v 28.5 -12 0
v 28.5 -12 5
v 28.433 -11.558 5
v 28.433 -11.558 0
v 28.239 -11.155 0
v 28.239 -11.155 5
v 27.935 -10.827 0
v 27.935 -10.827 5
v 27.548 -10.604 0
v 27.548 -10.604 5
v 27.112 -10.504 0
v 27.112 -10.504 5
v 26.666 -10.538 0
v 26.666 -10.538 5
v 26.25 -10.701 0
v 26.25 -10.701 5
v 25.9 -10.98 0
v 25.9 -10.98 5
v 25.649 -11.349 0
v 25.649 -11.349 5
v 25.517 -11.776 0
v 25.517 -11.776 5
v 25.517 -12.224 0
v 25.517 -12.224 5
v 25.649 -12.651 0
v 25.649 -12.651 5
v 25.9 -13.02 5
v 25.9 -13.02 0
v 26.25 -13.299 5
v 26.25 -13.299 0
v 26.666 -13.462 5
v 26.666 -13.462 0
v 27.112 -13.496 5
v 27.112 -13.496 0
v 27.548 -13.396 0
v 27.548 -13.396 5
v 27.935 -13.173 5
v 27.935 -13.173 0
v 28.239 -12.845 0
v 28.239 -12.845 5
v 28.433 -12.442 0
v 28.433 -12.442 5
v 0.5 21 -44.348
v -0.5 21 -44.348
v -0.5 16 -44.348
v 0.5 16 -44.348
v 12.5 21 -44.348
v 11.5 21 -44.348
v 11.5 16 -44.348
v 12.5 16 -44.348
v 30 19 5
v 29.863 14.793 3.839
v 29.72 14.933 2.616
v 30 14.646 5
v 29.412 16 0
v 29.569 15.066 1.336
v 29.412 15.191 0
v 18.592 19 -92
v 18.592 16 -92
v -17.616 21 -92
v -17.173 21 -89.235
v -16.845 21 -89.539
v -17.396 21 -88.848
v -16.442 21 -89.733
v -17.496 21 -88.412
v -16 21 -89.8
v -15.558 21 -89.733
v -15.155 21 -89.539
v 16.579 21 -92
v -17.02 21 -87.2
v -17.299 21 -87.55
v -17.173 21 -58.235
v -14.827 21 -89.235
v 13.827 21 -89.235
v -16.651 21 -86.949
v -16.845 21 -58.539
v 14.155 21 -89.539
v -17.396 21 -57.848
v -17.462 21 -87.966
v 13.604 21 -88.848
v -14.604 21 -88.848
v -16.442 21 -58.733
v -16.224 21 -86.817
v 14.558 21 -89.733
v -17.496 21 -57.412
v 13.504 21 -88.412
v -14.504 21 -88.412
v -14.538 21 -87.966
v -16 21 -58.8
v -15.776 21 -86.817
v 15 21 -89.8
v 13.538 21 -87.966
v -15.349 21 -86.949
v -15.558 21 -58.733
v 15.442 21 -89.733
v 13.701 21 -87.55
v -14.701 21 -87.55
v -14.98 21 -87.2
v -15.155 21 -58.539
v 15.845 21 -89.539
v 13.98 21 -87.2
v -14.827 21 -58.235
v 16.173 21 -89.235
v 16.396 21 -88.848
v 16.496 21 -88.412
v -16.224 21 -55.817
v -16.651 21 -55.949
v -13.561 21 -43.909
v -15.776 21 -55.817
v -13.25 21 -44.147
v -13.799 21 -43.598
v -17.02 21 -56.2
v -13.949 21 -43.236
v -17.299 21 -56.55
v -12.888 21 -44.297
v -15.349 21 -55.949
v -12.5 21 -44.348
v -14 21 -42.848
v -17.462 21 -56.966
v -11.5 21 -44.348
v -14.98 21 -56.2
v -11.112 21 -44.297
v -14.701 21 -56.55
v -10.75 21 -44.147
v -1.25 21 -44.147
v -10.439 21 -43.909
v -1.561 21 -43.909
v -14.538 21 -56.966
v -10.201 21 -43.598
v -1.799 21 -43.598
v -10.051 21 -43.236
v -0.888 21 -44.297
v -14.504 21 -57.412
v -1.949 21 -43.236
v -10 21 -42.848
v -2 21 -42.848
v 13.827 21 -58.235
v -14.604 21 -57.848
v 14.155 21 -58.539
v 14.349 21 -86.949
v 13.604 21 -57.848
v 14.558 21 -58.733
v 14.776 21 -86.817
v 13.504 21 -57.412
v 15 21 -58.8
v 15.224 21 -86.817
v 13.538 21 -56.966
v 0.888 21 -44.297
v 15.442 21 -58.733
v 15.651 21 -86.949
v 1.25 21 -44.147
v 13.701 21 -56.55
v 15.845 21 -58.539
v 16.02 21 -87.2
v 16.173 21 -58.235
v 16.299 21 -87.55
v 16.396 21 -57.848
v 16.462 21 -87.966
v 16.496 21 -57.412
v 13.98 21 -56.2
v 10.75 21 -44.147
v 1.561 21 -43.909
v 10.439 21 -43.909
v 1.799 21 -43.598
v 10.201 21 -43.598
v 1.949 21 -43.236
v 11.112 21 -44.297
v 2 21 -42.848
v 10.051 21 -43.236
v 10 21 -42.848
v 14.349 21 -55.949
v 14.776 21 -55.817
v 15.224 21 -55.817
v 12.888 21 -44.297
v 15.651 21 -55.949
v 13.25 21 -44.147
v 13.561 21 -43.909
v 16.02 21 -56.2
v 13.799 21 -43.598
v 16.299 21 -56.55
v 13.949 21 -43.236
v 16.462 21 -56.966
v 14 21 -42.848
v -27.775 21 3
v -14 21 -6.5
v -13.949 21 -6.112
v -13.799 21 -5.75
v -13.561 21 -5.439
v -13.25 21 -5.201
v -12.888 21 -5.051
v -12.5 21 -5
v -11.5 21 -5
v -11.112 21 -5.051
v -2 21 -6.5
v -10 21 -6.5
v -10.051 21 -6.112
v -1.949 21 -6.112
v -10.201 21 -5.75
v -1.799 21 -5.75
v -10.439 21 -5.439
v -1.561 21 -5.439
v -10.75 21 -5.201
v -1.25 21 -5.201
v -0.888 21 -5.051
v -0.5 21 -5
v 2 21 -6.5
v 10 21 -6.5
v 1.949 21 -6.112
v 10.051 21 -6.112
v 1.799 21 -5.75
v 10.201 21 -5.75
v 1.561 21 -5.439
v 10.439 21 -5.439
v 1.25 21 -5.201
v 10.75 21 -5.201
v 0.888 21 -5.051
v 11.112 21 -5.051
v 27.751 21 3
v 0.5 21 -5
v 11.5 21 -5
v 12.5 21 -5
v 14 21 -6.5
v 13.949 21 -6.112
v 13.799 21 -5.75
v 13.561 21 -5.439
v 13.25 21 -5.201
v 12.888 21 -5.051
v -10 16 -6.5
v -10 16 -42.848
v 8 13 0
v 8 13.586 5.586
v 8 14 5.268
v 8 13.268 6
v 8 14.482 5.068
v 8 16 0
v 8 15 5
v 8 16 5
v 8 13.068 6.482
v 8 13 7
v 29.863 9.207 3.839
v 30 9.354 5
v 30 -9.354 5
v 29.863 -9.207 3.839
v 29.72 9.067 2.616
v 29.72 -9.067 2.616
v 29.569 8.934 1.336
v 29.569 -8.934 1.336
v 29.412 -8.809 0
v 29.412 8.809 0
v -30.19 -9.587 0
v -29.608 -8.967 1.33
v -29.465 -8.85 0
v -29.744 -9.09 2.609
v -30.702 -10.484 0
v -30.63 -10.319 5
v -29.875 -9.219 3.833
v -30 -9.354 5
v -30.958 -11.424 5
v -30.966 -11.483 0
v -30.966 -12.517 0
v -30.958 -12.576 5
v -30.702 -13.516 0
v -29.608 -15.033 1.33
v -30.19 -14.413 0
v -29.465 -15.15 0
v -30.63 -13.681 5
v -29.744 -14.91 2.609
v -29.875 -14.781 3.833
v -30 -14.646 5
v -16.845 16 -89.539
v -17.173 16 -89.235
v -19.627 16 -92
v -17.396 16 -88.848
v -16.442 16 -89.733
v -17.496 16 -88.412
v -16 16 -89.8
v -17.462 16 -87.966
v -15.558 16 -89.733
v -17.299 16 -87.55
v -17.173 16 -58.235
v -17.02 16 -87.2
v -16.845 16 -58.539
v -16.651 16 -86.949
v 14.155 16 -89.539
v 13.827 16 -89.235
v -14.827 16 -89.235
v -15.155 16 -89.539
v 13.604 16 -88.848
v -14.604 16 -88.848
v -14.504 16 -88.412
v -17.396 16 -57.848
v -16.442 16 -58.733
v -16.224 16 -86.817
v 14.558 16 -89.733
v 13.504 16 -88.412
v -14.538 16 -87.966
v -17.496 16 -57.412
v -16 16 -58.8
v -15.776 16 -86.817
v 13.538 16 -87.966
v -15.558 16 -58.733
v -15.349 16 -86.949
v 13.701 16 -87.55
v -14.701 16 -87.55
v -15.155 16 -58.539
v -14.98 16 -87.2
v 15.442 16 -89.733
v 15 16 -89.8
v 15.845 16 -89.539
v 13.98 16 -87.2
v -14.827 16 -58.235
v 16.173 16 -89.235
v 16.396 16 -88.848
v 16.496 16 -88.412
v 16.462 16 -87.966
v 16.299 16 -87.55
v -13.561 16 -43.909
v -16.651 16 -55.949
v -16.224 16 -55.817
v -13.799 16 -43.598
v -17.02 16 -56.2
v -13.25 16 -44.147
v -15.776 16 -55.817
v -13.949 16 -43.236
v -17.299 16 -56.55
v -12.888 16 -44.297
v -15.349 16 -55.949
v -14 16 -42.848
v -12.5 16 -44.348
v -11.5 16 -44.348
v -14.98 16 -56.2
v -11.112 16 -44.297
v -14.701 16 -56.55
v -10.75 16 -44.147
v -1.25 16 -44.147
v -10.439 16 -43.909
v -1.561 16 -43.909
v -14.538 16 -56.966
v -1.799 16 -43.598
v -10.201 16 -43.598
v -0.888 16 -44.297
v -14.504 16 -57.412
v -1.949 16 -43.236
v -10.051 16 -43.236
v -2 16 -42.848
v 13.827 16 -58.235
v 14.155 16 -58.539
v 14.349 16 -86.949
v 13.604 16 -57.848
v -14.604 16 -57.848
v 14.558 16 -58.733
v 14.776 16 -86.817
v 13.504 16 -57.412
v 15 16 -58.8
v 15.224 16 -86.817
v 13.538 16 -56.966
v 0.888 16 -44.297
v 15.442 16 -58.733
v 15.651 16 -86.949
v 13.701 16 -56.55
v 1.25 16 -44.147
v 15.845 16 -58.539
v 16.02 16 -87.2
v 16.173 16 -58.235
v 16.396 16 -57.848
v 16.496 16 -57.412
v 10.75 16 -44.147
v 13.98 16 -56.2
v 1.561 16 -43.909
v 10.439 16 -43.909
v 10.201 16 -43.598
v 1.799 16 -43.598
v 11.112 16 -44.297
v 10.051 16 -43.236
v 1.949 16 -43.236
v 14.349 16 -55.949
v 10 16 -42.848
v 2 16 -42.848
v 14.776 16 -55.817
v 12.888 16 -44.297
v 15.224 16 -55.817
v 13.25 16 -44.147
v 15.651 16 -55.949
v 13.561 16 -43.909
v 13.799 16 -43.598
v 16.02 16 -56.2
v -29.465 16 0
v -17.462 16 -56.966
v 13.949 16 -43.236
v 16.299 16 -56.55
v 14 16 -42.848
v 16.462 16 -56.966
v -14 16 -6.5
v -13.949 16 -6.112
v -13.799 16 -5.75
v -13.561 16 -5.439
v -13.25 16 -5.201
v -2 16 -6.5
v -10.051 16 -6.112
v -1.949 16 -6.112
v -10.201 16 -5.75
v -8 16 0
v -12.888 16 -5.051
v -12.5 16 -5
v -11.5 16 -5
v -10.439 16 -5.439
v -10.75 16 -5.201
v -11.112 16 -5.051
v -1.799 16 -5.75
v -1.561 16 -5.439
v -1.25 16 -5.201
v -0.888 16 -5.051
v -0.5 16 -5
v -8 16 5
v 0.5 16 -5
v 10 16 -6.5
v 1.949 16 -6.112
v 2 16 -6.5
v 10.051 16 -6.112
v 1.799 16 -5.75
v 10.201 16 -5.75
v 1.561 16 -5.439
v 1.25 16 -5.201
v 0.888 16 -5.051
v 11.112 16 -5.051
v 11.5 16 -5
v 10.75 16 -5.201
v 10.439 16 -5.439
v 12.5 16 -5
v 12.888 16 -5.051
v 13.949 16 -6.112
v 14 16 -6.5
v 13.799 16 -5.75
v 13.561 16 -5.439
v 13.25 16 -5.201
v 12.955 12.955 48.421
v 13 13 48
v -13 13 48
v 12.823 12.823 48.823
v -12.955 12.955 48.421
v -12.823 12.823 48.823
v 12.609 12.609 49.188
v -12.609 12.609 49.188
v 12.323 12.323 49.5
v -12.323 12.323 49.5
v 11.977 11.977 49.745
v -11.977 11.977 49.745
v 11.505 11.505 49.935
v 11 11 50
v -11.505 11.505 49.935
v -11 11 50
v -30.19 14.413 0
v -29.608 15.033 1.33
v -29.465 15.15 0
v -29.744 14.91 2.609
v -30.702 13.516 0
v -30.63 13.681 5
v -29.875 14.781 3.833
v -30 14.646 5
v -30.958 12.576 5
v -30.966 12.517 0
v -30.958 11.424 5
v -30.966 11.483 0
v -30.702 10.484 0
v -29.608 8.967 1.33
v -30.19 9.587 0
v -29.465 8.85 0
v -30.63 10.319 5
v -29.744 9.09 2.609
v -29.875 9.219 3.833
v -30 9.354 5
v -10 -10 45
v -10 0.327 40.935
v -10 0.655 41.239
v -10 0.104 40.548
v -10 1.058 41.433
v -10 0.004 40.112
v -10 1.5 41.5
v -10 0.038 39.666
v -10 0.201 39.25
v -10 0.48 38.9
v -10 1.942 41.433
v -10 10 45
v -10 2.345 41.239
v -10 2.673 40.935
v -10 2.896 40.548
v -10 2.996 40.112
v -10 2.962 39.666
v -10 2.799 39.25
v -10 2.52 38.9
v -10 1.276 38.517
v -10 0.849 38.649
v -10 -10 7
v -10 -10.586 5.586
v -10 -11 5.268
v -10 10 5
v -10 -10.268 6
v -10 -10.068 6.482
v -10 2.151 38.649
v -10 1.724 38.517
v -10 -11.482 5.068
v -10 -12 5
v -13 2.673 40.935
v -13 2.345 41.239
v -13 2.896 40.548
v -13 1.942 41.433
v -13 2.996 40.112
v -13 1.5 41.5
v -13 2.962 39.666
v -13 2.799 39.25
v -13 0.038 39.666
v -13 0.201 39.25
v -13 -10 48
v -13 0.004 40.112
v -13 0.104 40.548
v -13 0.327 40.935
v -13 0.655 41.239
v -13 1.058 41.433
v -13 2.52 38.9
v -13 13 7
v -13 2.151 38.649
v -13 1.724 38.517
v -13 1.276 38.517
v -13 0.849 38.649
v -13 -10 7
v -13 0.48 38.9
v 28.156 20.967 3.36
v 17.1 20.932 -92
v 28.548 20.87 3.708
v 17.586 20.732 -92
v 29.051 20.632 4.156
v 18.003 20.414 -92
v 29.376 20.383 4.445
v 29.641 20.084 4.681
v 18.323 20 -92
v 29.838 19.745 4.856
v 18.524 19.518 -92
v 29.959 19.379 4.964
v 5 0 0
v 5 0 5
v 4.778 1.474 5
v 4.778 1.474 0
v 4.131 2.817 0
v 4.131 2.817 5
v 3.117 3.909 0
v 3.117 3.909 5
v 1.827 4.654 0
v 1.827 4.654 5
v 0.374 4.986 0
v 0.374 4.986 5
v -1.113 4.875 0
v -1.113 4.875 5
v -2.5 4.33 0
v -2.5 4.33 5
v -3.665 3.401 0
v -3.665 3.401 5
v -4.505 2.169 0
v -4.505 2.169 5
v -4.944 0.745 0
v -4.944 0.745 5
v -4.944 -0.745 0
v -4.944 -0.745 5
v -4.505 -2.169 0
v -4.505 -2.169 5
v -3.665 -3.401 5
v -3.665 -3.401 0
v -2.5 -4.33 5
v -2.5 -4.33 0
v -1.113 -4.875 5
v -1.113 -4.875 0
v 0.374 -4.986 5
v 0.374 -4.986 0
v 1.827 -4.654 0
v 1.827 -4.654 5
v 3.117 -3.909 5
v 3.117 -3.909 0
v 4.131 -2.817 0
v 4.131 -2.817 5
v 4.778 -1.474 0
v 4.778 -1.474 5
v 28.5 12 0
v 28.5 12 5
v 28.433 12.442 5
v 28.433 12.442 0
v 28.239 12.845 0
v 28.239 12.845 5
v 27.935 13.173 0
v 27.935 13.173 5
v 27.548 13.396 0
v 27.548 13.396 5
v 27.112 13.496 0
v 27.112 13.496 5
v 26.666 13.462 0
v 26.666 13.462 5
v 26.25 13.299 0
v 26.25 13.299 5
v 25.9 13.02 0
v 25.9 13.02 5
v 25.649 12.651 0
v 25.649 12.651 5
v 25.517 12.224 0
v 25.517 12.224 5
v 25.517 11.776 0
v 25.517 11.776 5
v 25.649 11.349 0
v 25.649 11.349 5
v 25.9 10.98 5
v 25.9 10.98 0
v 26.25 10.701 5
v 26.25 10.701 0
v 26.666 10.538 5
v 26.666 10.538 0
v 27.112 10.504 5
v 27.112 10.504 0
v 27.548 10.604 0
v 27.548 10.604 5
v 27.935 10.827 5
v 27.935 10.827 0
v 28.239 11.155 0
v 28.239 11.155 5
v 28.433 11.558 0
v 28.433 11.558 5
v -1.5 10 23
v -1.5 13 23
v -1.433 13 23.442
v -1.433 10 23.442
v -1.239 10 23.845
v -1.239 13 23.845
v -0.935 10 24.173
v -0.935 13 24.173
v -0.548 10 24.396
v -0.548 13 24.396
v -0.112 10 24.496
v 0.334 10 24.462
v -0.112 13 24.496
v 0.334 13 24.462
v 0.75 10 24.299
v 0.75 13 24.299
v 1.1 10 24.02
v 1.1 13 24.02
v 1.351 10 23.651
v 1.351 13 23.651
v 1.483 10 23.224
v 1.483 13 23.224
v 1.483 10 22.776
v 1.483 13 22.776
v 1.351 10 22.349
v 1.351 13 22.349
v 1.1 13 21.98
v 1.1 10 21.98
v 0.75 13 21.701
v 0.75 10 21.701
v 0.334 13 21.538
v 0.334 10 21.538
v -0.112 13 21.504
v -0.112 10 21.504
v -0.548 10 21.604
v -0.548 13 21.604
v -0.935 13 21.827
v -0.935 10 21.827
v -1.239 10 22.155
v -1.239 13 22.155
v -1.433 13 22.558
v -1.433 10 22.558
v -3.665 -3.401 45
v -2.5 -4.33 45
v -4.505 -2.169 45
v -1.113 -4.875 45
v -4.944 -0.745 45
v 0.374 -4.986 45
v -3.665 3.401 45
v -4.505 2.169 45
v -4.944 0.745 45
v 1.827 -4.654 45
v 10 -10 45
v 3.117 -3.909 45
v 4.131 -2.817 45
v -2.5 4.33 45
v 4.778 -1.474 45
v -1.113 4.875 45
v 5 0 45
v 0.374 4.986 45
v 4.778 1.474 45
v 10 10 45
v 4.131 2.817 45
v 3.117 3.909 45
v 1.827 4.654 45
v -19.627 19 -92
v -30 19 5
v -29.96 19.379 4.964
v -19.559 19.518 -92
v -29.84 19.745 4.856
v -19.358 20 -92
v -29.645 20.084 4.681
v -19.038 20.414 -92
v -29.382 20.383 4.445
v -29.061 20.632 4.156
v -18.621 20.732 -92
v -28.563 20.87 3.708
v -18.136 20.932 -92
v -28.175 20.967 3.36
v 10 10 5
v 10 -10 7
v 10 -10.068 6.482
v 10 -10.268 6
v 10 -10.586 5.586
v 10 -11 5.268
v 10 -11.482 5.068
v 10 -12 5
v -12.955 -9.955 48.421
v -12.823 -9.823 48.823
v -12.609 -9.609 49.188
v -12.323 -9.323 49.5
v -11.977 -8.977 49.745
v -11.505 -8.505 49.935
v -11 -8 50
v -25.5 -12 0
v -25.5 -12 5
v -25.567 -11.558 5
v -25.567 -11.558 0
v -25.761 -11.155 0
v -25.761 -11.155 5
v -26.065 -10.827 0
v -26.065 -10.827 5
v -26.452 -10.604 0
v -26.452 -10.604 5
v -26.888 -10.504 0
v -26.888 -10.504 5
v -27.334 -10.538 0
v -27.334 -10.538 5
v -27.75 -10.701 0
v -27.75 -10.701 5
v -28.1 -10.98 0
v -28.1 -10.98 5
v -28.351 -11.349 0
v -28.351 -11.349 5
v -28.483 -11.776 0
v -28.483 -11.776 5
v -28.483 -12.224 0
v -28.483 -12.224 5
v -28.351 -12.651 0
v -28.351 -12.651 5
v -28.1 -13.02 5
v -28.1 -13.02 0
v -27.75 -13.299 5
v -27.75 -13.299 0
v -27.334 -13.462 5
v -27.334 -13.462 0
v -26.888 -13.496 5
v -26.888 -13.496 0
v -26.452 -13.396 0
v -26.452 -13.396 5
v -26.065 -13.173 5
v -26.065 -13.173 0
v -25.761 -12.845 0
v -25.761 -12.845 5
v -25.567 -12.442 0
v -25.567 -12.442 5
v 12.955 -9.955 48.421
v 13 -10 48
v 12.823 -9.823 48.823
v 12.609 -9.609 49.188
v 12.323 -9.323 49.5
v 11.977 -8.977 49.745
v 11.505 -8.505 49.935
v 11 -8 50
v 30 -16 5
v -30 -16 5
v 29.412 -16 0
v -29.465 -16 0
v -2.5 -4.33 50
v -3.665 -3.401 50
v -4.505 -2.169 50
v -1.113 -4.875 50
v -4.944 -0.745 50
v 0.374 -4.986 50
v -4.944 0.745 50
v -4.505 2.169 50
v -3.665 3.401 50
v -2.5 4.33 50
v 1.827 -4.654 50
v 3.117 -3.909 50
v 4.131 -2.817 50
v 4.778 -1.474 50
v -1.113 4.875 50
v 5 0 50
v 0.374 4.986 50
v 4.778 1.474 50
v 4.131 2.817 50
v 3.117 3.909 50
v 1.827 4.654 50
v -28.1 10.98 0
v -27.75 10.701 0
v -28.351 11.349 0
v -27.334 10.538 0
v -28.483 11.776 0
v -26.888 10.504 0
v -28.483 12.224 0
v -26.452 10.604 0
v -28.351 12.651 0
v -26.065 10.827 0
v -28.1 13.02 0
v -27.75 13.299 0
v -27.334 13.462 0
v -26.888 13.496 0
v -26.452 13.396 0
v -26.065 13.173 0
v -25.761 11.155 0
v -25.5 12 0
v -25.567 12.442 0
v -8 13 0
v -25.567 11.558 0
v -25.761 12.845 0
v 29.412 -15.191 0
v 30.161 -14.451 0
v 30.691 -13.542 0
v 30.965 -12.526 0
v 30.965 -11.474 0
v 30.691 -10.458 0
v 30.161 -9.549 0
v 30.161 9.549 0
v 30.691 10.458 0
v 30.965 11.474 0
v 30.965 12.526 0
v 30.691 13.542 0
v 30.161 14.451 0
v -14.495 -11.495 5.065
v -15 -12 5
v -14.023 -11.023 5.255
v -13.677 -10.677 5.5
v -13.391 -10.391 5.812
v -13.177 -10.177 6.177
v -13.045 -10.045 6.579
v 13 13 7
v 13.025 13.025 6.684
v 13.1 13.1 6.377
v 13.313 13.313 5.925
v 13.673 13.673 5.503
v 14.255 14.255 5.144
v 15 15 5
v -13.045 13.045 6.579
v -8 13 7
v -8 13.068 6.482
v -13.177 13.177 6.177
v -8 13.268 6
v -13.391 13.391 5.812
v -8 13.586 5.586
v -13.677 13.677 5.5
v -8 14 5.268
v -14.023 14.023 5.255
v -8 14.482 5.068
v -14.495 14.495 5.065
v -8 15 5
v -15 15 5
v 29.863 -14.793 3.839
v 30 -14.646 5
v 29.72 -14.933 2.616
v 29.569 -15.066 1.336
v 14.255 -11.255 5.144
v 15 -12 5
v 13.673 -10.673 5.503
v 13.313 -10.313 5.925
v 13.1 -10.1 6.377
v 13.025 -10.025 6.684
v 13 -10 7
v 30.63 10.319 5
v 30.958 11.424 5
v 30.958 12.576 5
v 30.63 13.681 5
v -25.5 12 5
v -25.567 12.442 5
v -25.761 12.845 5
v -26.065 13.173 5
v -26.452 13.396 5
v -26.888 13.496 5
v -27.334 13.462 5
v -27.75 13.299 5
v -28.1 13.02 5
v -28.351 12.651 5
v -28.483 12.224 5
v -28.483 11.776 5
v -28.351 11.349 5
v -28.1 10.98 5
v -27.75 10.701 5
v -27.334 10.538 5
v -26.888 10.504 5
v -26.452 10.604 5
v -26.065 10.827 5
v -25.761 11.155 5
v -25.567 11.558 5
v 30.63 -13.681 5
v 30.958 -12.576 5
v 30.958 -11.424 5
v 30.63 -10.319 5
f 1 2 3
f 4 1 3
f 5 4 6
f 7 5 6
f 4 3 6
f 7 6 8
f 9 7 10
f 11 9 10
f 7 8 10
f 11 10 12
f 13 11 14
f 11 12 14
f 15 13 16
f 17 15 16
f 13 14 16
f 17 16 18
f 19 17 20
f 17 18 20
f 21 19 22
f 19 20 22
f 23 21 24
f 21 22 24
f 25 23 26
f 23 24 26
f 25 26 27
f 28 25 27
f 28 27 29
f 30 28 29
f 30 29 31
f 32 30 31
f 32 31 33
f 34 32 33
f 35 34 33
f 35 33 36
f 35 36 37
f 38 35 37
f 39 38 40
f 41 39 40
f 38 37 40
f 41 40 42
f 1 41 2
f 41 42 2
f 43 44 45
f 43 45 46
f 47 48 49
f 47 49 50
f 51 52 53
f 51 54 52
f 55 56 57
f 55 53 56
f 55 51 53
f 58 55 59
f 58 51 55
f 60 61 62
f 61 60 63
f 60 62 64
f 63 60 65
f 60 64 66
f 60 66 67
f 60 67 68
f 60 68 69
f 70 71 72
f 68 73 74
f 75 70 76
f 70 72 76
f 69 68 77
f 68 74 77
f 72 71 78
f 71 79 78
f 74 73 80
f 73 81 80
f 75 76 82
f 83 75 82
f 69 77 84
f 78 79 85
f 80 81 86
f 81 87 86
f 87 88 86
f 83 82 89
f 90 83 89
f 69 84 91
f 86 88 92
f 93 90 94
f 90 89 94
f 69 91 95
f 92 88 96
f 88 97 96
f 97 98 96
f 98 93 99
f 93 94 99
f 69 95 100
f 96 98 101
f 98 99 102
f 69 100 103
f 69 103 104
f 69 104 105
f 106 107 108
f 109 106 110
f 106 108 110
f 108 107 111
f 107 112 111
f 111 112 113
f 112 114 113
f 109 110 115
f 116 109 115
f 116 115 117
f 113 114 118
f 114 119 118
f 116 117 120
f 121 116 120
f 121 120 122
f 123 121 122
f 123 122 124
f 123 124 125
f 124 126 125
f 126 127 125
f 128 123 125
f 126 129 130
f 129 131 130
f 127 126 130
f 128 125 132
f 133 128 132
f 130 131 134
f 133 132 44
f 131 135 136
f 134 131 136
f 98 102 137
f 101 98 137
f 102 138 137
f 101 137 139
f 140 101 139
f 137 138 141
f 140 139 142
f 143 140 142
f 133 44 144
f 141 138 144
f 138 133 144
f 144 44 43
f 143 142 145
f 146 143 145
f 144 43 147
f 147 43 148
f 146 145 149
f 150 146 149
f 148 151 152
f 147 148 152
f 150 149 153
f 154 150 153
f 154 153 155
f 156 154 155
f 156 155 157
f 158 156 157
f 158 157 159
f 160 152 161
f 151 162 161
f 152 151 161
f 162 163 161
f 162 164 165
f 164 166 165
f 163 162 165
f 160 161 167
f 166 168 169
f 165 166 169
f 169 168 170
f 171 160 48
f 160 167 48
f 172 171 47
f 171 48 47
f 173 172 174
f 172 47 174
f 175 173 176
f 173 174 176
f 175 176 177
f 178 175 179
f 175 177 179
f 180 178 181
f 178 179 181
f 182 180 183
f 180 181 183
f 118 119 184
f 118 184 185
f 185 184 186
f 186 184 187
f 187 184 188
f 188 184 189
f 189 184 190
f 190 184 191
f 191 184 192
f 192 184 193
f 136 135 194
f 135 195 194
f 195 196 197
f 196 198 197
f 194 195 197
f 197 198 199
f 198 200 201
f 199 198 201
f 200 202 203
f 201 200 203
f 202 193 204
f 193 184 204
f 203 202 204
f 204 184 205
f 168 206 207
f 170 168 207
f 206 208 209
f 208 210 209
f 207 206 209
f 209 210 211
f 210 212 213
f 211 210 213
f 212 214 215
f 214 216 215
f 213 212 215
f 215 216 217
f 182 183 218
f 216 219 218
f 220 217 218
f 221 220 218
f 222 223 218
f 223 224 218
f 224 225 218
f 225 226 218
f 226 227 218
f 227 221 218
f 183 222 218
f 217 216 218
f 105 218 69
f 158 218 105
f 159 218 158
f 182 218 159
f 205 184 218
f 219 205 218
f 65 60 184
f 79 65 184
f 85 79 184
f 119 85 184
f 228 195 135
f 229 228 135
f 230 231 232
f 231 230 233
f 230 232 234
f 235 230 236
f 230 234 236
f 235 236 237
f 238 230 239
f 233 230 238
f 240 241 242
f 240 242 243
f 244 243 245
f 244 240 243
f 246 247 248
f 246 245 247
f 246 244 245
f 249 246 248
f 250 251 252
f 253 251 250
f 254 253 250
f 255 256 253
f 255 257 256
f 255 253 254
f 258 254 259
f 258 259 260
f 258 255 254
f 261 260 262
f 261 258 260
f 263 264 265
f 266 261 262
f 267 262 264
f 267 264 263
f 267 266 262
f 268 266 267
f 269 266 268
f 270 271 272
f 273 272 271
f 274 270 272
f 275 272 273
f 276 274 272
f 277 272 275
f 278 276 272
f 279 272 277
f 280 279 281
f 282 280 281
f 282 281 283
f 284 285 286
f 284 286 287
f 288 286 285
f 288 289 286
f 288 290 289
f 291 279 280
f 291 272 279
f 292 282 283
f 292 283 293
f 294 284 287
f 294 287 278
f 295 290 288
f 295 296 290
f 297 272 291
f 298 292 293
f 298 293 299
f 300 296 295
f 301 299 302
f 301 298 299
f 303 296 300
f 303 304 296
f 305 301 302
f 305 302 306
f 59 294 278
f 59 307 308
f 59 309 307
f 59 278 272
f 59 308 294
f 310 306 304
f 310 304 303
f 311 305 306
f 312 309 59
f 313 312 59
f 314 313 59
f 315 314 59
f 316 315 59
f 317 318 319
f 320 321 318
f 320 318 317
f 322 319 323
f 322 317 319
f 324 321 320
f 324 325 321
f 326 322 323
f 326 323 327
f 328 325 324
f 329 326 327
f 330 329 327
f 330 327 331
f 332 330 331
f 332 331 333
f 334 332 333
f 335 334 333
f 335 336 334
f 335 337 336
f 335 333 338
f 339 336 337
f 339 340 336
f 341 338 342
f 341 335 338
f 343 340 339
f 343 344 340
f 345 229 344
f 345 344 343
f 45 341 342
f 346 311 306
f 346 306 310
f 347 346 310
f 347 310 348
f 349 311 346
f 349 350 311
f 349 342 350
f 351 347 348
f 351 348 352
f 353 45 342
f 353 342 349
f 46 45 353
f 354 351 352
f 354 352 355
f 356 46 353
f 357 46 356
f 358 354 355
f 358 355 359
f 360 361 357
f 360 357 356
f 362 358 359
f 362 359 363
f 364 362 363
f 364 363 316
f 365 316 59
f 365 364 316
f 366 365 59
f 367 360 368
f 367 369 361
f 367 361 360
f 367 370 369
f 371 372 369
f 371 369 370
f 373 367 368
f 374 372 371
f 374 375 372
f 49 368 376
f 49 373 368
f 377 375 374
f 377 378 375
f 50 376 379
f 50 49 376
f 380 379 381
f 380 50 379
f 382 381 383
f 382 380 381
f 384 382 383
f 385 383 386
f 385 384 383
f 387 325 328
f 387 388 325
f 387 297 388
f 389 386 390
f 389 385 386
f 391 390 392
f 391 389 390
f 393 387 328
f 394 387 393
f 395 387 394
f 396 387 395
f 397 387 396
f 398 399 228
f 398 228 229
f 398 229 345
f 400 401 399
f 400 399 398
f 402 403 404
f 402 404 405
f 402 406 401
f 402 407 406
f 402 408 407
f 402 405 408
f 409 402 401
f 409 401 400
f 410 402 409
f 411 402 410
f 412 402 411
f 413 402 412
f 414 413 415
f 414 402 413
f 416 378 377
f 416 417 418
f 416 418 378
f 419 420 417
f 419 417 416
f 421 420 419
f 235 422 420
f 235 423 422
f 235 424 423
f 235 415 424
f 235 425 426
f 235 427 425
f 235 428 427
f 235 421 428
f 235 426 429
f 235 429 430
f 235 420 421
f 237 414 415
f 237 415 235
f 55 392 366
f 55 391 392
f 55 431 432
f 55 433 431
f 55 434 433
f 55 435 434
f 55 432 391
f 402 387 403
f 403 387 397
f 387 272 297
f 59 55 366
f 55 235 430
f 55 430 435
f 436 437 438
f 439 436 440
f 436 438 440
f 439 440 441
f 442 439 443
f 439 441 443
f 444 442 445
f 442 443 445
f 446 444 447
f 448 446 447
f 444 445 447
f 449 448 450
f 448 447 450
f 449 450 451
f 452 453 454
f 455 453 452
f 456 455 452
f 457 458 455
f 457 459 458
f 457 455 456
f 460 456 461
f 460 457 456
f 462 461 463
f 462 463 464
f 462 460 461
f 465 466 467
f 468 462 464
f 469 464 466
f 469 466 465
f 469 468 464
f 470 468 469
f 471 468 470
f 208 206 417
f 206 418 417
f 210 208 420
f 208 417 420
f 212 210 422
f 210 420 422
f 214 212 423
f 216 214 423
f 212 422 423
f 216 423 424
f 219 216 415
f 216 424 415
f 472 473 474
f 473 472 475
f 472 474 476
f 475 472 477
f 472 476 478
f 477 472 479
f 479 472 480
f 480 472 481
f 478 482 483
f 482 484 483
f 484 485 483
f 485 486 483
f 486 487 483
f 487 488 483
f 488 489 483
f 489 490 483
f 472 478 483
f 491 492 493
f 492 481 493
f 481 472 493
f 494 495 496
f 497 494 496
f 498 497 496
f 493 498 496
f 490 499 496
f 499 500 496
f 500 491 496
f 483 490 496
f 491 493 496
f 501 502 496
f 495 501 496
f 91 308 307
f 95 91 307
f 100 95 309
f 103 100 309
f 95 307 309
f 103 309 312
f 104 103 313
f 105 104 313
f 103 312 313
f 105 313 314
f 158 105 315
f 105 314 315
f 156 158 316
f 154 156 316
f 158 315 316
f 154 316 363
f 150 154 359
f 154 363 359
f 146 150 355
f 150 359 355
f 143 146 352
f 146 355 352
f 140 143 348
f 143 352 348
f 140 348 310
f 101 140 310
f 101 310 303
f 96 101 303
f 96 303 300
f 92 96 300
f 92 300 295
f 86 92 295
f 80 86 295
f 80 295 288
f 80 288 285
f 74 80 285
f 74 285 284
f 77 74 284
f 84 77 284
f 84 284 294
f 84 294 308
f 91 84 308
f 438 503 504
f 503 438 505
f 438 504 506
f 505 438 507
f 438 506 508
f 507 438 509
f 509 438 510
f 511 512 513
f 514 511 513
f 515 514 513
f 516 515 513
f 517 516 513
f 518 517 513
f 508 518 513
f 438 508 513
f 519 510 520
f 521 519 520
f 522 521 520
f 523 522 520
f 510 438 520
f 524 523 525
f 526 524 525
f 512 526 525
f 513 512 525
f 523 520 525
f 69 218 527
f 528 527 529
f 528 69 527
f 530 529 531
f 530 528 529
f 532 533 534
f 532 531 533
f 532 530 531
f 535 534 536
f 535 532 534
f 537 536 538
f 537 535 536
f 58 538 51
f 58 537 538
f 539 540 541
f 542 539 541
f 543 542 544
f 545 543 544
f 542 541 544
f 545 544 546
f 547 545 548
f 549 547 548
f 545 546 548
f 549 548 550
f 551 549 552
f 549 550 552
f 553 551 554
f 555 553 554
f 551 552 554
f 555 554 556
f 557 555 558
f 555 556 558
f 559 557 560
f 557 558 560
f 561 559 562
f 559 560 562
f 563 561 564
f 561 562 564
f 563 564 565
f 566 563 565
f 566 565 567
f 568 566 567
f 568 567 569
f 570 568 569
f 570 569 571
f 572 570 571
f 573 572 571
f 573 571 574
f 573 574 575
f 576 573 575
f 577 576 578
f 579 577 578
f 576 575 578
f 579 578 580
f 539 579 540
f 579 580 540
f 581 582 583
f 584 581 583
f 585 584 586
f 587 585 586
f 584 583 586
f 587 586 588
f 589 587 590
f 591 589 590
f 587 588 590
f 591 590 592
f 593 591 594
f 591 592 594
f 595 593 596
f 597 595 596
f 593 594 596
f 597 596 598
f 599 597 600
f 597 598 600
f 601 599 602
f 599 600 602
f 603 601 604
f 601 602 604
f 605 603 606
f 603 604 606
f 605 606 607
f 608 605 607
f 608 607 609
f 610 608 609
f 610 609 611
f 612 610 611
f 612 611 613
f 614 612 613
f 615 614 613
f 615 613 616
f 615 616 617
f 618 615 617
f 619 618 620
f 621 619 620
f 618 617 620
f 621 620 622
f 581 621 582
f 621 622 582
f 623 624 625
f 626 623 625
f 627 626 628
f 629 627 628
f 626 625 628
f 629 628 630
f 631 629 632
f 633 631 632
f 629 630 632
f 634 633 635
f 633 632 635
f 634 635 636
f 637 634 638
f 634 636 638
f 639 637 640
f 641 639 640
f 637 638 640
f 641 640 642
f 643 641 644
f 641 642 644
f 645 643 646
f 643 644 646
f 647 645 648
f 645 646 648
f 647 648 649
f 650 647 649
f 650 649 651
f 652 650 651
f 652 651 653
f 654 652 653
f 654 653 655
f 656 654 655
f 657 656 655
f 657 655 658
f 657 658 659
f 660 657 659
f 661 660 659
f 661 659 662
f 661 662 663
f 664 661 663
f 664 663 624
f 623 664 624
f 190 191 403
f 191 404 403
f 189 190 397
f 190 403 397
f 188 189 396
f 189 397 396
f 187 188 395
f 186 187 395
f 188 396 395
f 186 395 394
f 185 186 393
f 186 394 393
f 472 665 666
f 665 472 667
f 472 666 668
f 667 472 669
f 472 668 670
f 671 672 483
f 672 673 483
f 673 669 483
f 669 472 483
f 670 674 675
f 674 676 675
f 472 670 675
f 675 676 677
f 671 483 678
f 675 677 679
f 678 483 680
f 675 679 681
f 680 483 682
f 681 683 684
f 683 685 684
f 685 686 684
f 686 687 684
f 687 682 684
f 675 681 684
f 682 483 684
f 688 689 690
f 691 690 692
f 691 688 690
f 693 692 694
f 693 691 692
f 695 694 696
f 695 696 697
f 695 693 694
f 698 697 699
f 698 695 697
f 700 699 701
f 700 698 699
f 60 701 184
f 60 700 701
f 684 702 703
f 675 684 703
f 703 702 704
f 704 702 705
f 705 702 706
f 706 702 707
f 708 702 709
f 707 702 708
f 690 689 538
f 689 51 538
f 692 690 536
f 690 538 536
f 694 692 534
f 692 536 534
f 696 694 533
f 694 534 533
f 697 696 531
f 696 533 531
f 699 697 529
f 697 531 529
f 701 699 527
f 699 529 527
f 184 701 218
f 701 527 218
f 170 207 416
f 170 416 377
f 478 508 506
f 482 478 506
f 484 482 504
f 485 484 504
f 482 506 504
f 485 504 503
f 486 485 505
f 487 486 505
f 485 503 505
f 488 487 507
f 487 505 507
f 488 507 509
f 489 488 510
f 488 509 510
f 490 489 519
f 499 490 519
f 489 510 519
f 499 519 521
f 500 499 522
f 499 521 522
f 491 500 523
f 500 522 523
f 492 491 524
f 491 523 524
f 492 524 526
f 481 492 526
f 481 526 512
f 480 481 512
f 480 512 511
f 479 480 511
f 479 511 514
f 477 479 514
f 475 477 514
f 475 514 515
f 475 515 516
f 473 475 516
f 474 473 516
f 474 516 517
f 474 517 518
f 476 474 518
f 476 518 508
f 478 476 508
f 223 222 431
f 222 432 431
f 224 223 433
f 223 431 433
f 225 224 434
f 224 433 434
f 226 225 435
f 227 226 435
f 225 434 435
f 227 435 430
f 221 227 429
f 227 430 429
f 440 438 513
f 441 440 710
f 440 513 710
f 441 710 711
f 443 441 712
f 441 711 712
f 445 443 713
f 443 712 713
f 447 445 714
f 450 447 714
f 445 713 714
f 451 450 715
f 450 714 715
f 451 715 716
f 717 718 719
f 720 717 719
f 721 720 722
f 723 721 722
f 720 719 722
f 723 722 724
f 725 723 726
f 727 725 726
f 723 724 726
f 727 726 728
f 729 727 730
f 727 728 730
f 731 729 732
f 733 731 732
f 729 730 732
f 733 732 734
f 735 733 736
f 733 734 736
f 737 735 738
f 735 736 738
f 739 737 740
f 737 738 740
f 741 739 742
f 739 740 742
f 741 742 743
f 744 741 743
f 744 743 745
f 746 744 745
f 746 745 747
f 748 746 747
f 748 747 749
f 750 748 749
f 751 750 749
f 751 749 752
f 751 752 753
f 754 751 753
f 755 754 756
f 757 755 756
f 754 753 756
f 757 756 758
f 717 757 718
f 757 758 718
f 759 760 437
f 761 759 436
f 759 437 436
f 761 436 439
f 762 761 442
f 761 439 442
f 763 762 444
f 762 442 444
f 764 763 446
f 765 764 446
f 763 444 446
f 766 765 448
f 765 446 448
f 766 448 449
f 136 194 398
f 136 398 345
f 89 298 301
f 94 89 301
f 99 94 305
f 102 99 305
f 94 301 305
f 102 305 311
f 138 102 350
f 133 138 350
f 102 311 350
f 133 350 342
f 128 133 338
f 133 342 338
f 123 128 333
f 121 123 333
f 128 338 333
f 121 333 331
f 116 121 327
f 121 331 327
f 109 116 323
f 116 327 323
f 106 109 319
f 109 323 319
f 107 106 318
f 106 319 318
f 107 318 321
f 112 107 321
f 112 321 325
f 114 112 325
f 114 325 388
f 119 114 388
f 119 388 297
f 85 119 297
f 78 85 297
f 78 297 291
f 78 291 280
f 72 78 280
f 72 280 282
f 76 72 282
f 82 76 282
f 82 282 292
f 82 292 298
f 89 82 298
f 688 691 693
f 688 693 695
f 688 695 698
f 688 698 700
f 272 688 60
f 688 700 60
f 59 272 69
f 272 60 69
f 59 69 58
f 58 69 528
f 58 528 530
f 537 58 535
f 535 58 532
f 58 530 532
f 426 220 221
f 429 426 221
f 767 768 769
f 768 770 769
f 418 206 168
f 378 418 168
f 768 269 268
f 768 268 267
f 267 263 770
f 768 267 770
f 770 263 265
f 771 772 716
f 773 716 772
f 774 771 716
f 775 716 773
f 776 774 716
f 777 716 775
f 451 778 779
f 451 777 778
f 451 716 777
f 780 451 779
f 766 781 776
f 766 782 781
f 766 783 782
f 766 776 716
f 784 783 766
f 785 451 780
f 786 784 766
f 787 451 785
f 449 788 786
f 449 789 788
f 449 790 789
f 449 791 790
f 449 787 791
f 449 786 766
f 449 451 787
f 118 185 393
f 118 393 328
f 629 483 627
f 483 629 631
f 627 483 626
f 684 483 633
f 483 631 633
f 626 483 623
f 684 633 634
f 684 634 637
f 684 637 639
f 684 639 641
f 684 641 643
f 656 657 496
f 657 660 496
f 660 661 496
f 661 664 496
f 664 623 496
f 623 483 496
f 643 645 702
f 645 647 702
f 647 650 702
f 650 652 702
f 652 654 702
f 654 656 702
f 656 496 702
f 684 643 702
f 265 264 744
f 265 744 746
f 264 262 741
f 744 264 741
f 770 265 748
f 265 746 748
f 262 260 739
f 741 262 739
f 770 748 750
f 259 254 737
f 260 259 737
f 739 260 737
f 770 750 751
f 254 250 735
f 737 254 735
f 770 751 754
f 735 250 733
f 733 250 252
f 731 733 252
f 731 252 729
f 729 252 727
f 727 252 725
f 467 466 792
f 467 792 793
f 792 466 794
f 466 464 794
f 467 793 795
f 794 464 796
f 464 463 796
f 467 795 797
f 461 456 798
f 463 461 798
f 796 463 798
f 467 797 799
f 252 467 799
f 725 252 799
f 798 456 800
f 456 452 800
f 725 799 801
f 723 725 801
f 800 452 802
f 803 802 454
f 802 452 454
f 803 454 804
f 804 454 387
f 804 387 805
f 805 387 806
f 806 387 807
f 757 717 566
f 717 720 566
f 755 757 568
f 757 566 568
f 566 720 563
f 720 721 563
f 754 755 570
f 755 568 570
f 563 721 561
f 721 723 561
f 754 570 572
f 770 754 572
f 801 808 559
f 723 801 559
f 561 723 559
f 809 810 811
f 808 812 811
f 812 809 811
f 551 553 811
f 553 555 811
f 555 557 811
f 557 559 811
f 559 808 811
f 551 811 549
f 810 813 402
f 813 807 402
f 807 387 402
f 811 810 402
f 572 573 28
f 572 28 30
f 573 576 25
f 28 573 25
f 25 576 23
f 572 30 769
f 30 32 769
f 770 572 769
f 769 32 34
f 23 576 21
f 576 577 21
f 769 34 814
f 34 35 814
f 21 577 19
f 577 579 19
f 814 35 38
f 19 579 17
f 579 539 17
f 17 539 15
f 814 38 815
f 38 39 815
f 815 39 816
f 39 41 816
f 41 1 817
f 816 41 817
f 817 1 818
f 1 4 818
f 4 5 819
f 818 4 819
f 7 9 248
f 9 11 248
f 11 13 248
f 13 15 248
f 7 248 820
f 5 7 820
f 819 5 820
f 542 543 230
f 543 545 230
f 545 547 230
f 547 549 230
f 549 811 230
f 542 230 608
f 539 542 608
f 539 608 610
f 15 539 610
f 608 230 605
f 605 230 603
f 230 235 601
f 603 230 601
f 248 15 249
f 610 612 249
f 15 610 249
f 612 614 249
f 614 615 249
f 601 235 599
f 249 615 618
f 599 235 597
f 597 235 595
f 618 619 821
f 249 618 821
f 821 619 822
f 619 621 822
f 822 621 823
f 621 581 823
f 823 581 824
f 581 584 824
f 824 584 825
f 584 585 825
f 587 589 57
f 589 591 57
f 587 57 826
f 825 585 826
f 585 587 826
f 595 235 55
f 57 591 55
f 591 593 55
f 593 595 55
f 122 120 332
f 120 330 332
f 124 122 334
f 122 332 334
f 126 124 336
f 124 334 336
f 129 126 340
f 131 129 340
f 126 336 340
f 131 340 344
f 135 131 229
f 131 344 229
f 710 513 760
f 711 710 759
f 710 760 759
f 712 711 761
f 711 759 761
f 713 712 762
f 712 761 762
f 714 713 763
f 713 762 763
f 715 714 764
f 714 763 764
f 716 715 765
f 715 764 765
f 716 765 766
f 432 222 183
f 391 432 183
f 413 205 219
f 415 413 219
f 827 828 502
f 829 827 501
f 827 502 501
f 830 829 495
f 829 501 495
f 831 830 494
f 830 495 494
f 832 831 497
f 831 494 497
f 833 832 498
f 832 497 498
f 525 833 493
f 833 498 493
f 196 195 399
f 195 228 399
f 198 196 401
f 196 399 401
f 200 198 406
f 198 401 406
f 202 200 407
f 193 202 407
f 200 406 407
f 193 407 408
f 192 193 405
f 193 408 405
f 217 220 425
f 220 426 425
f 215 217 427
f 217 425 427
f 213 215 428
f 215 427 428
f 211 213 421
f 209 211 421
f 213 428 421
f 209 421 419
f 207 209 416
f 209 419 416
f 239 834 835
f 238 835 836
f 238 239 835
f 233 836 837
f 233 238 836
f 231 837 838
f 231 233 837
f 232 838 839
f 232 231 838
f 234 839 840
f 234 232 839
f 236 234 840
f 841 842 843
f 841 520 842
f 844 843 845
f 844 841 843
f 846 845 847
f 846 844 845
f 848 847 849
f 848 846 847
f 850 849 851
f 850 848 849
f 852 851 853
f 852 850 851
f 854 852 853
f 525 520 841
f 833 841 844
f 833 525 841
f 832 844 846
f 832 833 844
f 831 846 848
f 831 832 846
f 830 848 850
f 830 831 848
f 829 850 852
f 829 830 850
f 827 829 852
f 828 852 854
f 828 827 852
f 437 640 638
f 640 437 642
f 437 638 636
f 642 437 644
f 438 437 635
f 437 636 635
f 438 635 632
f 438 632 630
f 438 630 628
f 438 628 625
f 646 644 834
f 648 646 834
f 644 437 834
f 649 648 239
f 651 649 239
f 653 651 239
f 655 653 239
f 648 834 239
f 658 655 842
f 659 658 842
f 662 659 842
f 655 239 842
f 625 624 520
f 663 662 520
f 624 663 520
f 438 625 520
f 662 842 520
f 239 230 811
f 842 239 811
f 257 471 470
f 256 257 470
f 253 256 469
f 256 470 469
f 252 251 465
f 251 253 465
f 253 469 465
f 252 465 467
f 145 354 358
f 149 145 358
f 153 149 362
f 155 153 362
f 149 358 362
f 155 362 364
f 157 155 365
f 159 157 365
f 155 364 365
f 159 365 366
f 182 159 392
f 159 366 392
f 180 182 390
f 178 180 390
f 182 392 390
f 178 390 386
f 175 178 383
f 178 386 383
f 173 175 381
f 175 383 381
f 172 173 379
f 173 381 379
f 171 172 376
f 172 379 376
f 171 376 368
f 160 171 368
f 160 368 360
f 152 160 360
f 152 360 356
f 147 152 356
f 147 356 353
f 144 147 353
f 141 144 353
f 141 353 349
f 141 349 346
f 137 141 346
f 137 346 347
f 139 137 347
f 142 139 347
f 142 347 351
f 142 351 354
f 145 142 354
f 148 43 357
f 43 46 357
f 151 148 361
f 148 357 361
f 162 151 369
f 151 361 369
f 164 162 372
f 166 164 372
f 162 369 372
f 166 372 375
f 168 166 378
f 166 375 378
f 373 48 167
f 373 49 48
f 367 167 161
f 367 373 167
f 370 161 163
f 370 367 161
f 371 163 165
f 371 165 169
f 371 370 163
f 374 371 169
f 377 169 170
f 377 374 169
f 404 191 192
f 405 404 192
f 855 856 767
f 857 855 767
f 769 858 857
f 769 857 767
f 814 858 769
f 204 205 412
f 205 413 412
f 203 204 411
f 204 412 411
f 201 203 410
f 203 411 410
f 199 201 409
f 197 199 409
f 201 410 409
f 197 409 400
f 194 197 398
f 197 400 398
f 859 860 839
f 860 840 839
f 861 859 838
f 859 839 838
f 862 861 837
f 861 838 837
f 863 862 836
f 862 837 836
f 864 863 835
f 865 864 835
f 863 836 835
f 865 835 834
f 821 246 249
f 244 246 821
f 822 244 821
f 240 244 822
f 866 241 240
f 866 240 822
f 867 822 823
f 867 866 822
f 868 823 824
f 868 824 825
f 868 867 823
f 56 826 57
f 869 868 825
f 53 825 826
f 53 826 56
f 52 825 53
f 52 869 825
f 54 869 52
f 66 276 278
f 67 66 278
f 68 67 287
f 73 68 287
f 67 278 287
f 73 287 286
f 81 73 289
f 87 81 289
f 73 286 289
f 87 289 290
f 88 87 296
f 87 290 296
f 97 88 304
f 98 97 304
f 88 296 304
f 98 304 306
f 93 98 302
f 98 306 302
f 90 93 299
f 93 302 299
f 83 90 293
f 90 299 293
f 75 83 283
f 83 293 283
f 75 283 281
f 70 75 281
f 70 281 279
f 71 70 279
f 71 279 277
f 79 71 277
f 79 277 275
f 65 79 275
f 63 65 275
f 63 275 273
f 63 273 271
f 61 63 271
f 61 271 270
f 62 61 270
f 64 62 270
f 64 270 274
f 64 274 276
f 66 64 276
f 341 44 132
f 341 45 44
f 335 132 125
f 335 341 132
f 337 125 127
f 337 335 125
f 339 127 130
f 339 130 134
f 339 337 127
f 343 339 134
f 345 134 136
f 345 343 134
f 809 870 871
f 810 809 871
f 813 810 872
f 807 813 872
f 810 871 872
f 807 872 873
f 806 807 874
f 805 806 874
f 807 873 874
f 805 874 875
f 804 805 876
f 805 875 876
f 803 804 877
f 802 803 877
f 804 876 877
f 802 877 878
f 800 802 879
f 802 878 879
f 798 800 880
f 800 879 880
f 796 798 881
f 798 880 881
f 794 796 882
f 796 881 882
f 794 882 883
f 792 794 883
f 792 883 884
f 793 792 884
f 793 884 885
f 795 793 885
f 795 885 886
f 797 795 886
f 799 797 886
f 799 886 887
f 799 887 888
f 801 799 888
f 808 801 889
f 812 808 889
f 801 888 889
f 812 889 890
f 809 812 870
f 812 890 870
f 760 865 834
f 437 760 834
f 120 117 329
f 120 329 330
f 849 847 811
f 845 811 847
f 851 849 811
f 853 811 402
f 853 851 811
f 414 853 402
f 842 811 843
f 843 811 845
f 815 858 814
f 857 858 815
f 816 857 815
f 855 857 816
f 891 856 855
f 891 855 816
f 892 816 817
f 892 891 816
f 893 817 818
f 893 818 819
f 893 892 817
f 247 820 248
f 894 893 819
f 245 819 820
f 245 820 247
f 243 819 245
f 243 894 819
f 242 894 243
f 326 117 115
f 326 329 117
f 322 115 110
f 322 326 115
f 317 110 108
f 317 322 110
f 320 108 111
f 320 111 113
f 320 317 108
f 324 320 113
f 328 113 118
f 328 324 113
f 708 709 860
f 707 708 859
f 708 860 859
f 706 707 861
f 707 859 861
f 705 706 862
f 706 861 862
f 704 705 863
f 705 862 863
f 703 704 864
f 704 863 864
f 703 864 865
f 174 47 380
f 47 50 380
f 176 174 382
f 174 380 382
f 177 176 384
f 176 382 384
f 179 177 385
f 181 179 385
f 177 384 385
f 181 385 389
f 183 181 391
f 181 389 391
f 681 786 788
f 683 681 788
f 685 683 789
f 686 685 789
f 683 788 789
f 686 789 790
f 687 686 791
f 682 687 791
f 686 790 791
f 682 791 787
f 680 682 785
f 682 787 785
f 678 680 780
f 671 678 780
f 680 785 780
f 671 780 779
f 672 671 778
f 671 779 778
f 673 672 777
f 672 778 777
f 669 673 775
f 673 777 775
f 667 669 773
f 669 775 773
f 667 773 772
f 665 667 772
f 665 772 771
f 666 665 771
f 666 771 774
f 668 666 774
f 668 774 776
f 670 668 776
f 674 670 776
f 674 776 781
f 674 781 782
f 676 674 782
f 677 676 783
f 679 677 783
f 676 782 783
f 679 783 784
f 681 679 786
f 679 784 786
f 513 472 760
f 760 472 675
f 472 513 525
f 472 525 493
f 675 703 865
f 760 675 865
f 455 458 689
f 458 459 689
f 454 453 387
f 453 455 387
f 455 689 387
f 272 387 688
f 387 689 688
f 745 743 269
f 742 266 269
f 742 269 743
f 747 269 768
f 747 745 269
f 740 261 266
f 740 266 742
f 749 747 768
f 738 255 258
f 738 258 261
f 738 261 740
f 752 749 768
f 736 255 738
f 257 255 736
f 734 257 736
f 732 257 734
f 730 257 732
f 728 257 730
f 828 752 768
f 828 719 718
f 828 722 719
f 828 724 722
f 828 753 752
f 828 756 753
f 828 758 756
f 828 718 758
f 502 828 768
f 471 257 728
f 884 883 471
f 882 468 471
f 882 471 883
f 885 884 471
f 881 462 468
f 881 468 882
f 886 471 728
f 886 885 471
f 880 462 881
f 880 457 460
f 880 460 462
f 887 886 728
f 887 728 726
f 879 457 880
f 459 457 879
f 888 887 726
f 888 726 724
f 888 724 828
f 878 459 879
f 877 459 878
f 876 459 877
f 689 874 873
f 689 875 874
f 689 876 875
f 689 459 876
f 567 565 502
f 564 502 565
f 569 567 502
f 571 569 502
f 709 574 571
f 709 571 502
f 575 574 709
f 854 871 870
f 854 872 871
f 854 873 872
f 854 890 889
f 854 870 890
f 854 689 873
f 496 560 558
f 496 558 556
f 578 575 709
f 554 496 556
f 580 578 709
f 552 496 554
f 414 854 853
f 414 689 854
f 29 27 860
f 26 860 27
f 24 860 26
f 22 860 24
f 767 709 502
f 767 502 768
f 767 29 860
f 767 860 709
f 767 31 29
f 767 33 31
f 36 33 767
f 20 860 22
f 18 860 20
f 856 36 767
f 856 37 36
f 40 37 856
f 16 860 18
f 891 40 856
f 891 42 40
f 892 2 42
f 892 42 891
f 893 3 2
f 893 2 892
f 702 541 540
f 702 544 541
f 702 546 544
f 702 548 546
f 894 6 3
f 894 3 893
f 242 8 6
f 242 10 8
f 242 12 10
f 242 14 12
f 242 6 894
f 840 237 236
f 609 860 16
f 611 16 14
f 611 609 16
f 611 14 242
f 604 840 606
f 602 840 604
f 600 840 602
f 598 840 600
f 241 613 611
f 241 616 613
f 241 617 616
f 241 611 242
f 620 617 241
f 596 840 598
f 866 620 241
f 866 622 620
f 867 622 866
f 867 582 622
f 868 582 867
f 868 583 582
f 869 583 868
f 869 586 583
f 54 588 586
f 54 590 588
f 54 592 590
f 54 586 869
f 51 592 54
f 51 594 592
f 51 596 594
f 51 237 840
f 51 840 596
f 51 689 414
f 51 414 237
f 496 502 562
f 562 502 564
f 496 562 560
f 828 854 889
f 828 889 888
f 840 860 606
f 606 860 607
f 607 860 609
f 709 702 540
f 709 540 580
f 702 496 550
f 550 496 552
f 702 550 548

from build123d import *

# Parameters (mm, degrees)
SKETCH1_W           = 60
SKETCH1_H           = 32
BOSS_EXTRUDE1_DEPTH = 5
SKETCH2_R           = 1.5
CUT_EXTRUDE1_DEPTH  = 5
SKETCH4_R           = 5
CUT_EXTRUDE2_DEPTH  = 5
SKETCH5_W           = 60
SKETCH5_H           = 5
BOSS_EXTRUDE2_DEPTH = 97
SKETCH6_R           = 1.5
CUT_EXTRUDE3_DEPTH  = 100
CUT_EXTRUDE4_DEPTH  = 100
BOSS_EXTRUDE3_DEPTH = 45
SKETCH9_W           = 26
SKETCH9_H           = 23
BOSS_EXTRUDE4_DEPTH = 5
SKETCH10_R          = 5
CUT_EXTRUDE5_DEPTH  = 5
SKETCH17_W          = 16
SKETCH17_H          = 3
CUT_EXTRUDE6_DEPTH  = 10
SKETCH18_R          = 1.5
CUT_EXTRUDE7_DEPTH  = 10
FILLET3_R           = 2
FILLET4_R           = 2
FILLET5_R           = 2
SKETCH34_R          = 4
SKETCH34_R_2        = 1.5
BOSS_EXTRUDE5_DEPTH = 5
SKETCH36_R          = 4
SKETCH36_R_2        = 1.5
BOSS_EXTRUDE6_DEPTH = 5
SKETCH37_R          = 4
SKETCH37_R_2        = 1.5
BOSS_EXTRUDE7_DEPTH = 5
SKETCH38_R          = 4
SKETCH38_R_2        = 1.5
BOSS_EXTRUDE8_DEPTH = 5
SKETCH40_W          = 4
SKETCH40_H          = 39.348212258
CUT_EXTRUDE8_DEPTH  = 10
FILLET6_R           = 1.5
SKETCH43_R          = 1.5
CUT_EXTRUDE10_DEPTH = 9


with BuildPart() as part:
    # Sketch1 → Boss-Extrude1 (new body)
    with BuildSketch(Plane.XY):
        Rectangle(SKETCH1_W, SKETCH1_H)
    extrude(amount=BOSS_EXTRUDE1_DEPTH)

    # Sketch2 → Cut-Extrude1 (cut)
    with BuildSketch(Plane.XY.offset(5)):
        with Locations((27, 12)):
            Circle(SKETCH2_R)
        with Locations((27, -12)):
            Circle(SKETCH2_R)
        with Locations((-27, -12)):
            Circle(SKETCH2_R)
        with Locations((-27, 12)):
            Circle(SKETCH2_R)
    extrude(amount=-CUT_EXTRUDE1_DEPTH, mode=Mode.SUBTRACT)

    # Sketch4 → Cut-Extrude2 (cut)
    with BuildSketch(Plane.XY.offset(5)):
        Circle(SKETCH4_R)
    extrude(amount=-CUT_EXTRUDE2_DEPTH, mode=Mode.SUBTRACT)

    # Sketch5 → Boss-Extrude2 (add)
    with BuildSketch(Plane.XY.offset(5)):
        with Locations((0, 18.5)):
            Rectangle(SKETCH5_W, SKETCH5_H)
    extrude(amount=-BOSS_EXTRUDE2_DEPTH)

    # Sketch6 → Cut-Extrude3 (cut)
    with BuildSketch(Plane.XZ.offset(-16)):
        with Locations(Location((15, -57.3, 0), (0, 0, 270))):
            Circle(SKETCH6_R)
        with Locations(Location((-16, -57.3, 0), (0, 0, 270))):
            Circle(SKETCH6_R)
        with Locations(Location((15, -88.3, 0), (0, 0, 270))):
            Circle(SKETCH6_R)
        with Locations(Location((-16, -88.3, 0), (0, 0, 270))):
            Circle(SKETCH6_R)
    extrude(amount=-CUT_EXTRUDE3_DEPTH, mode=Mode.SUBTRACT)

    # Sketch7 → Cut-Extrude4 (cut)
    with BuildSketch(Plane(origin=(0, 21, 0), x_dir=(1, 0, 0), z_dir=(0, 1, 0))):
        Polygon((30, -5), (18.592432289, 92), (30, 92), align=None)
        Polygon((-30, -5), (-19.627140112, 92), (-30, 92), align=None)
    extrude(amount=-CUT_EXTRUDE4_DEPTH, mode=Mode.SUBTRACT)

    # Sketch8 → Boss-Extrude3 (add)
    with BuildSketch(Plane.XY.offset(5)):
        Polygon((13, 13), (-13, 13), (-13, -10), (-10, -10), (-10, 10), (10, 10), (10, -10), (13, -10), align=None)
    extrude(amount=BOSS_EXTRUDE3_DEPTH)

    # Sketch9 → Boss-Extrude4 (add)
    with BuildSketch(Plane.XY.offset(50)):
        with Locations((0, 1.5)):
            Rectangle(SKETCH9_W, SKETCH9_H)
    extrude(amount=-BOSS_EXTRUDE4_DEPTH)

    # Sketch10 → Cut-Extrude5 (cut)
    with BuildSketch(Plane.XY.offset(50)):
        Circle(SKETCH10_R)
    extrude(amount=-CUT_EXTRUDE5_DEPTH, mode=Mode.SUBTRACT)

    # Sketch17 → Cut-Extrude6 (cut)
    with BuildSketch(Plane.XY.offset(5)):
        with Locations((0, 14.5)):
            Rectangle(SKETCH17_W, SKETCH17_H)
    extrude(amount=-CUT_EXTRUDE6_DEPTH, mode=Mode.SUBTRACT)

    # Sketch18 → Cut-Extrude7 (cut)
    with BuildSketch(Plane(origin=(0, 13, 0), x_dir=(1, 0, 0), z_dir=(0, 1, 0))):
        with Locations(Location((0, -23, 0), (0, 0, 180))):
            Circle(SKETCH18_R)
    extrude(amount=-CUT_EXTRUDE7_DEPTH, mode=Mode.SUBTRACT)

    # Fillet3
    fillet3_edges = [part.edges().sort_by_distance(p)[0] for p in [
        (0, 21, 5),
        (24.296216145, 21, -43.5),
        (-24.813570056, 21, -43.5),
    ]]
    fillet(fillet3_edges, radius=FILLET3_R)

    # Fillet4
    fillet4_edges = [part.edges().sort_by_distance(p)[0] for p in [
        (0, -10, 50),
        (13, 1.5, 50),
        (0, 13, 50),
        (-13, 1.5, 50),
    ]]
    fillet(fillet4_edges, radius=FILLET4_R)

    # Fillet5
    fillet5_edges = [part.edges().sort_by_distance(p)[0] for p in [
        (11.5, -10, 5),
        (13, 1.5, 5),
        (10.5, 13, 5),
        (-13, 1.5, 5),
        (-11.5, -10, 5),
        (-10.5, 13, 5),
    ]]
    fillet(fillet5_edges, radius=FILLET5_R)

    # Sketch34 → Boss-Extrude5 (add)
    with BuildSketch(Plane.XY.offset(5)):
        with Locations((-27, 12)):
            Circle(SKETCH34_R)
        with Locations((-27, 12)):
            Circle(SKETCH34_R_2, mode=Mode.SUBTRACT)
    extrude(amount=-BOSS_EXTRUDE5_DEPTH)

    # Sketch36 → Boss-Extrude6 (add)
    with BuildSketch(Plane.XY.offset(5)):
        with Locations((-27, -12)):
            Circle(SKETCH36_R)
        with Locations((-27, -12)):
            Circle(SKETCH36_R_2, mode=Mode.SUBTRACT)
    extrude(amount=-BOSS_EXTRUDE6_DEPTH)

    # Sketch37 → Boss-Extrude7 (add)
    with BuildSketch(Plane.XY.offset(5)):
        with Locations((27, 12)):
            Circle(SKETCH37_R)
        with Locations((27, 12)):
            Circle(SKETCH37_R_2, mode=Mode.SUBTRACT)
    extrude(amount=-BOSS_EXTRUDE7_DEPTH)

    # Sketch38 → Boss-Extrude8 (add)
    with BuildSketch(Plane.XY.offset(5)):
        with Locations((27, -12)):
            Circle(SKETCH38_R)
        with Locations((27, -12)):
            Circle(SKETCH38_R_2, mode=Mode.SUBTRACT)
    extrude(amount=-BOSS_EXTRUDE8_DEPTH)

    # Sketch40 → Cut-Extrude8 (cut)
    with BuildSketch(Plane(origin=(0, 21, 0), x_dir=(1, 0, 0), z_dir=(0, 1, 0))):
        with Locations((12, 24.674106129)):
            Rectangle(SKETCH40_W, SKETCH40_H)
        with Locations((0, 24.674106129)):
            Rectangle(SKETCH40_W, SKETCH40_H)
        with Locations((-12, 24.674106129)):
            Rectangle(SKETCH40_W, SKETCH40_H)
    extrude(amount=-CUT_EXTRUDE8_DEPTH, mode=Mode.SUBTRACT)

    # Fillet6
    fillet6_edges = [part.edges().sort_by_distance(p)[0] for p in [
        (-10, 18.5, -5),
        (-14, 18.5, -5),
        (-14, 18.5, -44.348212258),
        (-10, 18.5, -44.348212258),
        (2, 18.5, -5),
        (-2, 18.5, -5),
        (-2, 18.5, -44.348212258),
        (2, 18.5, -44.348212258),
        (14, 18.5, -5),
        (10, 18.5, -5),
        (10, 18.5, -44.348212258),
        (14, 18.5, -44.348212258),
    ]]
    fillet(fillet6_edges, radius=FILLET6_R)

    # Sketch43 → Cut-Extrude10 (cut)
    with BuildSketch(Plane.ZY.offset(13)):
        with Locations((40, 1.5)):
            Circle(SKETCH43_R)
    extrude(amount=-CUT_EXTRUDE10_DEPTH, mode=Mode.SUBTRACT)


solid = part.part
